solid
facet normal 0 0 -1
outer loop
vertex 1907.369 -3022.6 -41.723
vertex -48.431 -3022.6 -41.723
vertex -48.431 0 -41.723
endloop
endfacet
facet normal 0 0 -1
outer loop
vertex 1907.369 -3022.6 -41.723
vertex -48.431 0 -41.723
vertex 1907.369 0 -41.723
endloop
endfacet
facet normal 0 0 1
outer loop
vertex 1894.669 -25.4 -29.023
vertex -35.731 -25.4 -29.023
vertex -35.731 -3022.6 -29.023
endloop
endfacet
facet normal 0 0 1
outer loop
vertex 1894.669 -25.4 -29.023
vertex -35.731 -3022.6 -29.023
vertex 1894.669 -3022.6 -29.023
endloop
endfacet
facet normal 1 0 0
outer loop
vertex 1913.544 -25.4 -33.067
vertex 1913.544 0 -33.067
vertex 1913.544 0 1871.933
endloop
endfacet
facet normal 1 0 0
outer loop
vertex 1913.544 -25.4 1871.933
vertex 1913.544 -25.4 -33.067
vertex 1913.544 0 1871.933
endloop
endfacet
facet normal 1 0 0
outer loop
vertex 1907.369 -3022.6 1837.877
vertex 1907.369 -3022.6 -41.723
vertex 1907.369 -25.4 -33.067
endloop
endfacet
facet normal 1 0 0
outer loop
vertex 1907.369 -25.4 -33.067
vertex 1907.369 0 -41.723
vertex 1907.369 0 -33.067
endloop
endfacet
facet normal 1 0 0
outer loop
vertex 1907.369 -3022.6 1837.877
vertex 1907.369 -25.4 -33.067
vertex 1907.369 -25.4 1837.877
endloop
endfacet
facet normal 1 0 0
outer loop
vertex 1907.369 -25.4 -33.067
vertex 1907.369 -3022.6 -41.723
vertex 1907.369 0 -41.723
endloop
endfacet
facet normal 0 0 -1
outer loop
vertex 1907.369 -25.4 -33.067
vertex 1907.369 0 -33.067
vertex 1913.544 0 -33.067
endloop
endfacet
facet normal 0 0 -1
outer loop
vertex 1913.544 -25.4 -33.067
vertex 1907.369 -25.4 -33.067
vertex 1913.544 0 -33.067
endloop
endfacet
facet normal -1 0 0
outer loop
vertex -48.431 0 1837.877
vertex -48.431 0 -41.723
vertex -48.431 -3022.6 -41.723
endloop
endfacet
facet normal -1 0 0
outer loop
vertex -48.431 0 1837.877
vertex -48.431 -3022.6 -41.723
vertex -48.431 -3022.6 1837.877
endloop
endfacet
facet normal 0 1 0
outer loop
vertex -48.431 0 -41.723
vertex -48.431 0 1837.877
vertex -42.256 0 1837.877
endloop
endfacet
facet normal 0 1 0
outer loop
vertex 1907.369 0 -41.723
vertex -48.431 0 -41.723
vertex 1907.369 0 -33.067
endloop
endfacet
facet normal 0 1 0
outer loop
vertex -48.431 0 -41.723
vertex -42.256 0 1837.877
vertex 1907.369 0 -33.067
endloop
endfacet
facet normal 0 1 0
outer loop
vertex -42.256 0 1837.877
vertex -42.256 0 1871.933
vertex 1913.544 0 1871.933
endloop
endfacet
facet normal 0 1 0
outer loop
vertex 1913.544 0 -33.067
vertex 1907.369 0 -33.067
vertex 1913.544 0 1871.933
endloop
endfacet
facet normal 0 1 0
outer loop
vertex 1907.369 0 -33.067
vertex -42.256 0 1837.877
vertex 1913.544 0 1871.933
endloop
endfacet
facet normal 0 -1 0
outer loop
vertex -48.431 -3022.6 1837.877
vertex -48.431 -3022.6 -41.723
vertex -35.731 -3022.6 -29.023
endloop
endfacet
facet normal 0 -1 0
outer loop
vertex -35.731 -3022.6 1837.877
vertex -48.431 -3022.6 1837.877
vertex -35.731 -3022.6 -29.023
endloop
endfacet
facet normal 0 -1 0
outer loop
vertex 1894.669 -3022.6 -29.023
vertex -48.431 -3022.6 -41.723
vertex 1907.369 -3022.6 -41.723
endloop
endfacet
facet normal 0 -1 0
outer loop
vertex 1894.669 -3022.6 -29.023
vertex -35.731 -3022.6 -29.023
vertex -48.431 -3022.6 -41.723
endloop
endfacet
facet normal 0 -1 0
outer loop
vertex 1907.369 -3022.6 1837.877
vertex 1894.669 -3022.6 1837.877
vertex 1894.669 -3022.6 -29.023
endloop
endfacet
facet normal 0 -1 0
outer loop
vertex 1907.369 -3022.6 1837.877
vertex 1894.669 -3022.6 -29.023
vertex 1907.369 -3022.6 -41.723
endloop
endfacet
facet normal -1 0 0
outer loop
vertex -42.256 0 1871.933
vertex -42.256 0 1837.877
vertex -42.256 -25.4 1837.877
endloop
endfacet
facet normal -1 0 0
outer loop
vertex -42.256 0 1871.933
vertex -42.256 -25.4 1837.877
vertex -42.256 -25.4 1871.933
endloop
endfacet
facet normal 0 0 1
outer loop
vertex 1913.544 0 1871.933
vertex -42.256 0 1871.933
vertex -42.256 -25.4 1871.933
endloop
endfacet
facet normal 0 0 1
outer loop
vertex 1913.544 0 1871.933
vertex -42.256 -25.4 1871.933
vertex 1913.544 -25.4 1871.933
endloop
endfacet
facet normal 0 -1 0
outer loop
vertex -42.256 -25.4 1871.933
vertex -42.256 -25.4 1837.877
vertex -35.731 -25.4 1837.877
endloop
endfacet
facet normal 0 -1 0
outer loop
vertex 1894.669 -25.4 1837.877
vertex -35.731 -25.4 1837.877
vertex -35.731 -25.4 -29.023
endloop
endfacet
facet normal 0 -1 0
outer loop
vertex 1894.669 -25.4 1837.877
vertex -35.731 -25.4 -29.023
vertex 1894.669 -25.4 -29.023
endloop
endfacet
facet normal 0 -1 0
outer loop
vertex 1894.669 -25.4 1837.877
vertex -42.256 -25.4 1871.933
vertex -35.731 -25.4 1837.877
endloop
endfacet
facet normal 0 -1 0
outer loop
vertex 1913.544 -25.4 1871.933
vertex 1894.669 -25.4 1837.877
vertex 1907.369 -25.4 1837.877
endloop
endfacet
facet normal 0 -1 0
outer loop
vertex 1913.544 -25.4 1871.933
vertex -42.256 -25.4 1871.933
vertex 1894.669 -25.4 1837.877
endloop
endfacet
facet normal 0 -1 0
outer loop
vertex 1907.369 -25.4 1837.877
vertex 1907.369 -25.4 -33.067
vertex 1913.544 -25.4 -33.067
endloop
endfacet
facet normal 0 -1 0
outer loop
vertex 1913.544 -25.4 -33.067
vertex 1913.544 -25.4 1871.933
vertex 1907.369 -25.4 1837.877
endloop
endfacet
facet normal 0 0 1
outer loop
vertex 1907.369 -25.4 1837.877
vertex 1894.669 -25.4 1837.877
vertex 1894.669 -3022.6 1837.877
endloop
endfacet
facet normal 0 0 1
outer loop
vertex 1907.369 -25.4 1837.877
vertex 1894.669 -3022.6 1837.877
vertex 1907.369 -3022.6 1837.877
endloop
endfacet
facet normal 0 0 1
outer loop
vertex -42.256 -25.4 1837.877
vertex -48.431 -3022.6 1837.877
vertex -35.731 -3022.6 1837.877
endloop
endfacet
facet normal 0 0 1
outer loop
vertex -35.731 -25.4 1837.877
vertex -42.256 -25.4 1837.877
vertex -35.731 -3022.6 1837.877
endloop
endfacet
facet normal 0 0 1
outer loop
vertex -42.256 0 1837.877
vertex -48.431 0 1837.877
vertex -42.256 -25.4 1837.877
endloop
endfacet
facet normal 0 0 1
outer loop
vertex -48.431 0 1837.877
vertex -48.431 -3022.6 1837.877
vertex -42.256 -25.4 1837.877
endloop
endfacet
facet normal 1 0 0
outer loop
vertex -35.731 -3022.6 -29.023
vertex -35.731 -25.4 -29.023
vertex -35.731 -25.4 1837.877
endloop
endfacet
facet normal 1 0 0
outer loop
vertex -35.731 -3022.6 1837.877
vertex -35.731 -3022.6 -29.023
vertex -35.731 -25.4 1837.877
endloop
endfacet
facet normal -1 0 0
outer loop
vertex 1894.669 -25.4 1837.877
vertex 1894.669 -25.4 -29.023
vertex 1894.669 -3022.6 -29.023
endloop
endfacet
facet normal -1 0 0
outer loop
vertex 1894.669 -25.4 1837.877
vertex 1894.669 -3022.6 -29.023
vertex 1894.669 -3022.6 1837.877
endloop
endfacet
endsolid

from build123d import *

# Parameters (mm, degrees)
F0_W     = 1955.8
F0_H     = 1905
F0_W_2   = 1930.4
F0_H_2   = 1879.6
F1_DEPTH = 3022.6
F2_W     = 1955.8
F2_H     = 1905
F3_DEPTH = 25.4
F4_DEPTH = 25.4


with BuildPart() as f1:
    # F0 (on Front) → F1 (new body)
    with BuildSketch(Plane.XZ):
        with Locations((929.4685886145, 910.7769945264)):
            Rectangle(F0_W, F0_H)
        with Locations((929.4685886145, 910.7769945264)):
            Rectangle(F0_W_2, F0_H_2, mode=Mode.SUBTRACT)
    extrude(amount=F1_DEPTH)

    # F2 (on Front) → F3 (join)
    with BuildSketch(Plane.XZ):
        with Locations((935.6444233, 919.4325165451)):
            Rectangle(F2_W, F2_H)
    extrude(amount=F3_DEPTH)

    # F4 (cut): a face of the model
    f4_faces = [f1.faces().sort_by_distance(p)[0] for p in [
        (929.4425031547, -1523.9595584052, 1863.2769945264),
    ]]
    extrude(f4_faces, amount=-F4_DEPTH, mode=Mode.SUBTRACT)


solid = f1.part
